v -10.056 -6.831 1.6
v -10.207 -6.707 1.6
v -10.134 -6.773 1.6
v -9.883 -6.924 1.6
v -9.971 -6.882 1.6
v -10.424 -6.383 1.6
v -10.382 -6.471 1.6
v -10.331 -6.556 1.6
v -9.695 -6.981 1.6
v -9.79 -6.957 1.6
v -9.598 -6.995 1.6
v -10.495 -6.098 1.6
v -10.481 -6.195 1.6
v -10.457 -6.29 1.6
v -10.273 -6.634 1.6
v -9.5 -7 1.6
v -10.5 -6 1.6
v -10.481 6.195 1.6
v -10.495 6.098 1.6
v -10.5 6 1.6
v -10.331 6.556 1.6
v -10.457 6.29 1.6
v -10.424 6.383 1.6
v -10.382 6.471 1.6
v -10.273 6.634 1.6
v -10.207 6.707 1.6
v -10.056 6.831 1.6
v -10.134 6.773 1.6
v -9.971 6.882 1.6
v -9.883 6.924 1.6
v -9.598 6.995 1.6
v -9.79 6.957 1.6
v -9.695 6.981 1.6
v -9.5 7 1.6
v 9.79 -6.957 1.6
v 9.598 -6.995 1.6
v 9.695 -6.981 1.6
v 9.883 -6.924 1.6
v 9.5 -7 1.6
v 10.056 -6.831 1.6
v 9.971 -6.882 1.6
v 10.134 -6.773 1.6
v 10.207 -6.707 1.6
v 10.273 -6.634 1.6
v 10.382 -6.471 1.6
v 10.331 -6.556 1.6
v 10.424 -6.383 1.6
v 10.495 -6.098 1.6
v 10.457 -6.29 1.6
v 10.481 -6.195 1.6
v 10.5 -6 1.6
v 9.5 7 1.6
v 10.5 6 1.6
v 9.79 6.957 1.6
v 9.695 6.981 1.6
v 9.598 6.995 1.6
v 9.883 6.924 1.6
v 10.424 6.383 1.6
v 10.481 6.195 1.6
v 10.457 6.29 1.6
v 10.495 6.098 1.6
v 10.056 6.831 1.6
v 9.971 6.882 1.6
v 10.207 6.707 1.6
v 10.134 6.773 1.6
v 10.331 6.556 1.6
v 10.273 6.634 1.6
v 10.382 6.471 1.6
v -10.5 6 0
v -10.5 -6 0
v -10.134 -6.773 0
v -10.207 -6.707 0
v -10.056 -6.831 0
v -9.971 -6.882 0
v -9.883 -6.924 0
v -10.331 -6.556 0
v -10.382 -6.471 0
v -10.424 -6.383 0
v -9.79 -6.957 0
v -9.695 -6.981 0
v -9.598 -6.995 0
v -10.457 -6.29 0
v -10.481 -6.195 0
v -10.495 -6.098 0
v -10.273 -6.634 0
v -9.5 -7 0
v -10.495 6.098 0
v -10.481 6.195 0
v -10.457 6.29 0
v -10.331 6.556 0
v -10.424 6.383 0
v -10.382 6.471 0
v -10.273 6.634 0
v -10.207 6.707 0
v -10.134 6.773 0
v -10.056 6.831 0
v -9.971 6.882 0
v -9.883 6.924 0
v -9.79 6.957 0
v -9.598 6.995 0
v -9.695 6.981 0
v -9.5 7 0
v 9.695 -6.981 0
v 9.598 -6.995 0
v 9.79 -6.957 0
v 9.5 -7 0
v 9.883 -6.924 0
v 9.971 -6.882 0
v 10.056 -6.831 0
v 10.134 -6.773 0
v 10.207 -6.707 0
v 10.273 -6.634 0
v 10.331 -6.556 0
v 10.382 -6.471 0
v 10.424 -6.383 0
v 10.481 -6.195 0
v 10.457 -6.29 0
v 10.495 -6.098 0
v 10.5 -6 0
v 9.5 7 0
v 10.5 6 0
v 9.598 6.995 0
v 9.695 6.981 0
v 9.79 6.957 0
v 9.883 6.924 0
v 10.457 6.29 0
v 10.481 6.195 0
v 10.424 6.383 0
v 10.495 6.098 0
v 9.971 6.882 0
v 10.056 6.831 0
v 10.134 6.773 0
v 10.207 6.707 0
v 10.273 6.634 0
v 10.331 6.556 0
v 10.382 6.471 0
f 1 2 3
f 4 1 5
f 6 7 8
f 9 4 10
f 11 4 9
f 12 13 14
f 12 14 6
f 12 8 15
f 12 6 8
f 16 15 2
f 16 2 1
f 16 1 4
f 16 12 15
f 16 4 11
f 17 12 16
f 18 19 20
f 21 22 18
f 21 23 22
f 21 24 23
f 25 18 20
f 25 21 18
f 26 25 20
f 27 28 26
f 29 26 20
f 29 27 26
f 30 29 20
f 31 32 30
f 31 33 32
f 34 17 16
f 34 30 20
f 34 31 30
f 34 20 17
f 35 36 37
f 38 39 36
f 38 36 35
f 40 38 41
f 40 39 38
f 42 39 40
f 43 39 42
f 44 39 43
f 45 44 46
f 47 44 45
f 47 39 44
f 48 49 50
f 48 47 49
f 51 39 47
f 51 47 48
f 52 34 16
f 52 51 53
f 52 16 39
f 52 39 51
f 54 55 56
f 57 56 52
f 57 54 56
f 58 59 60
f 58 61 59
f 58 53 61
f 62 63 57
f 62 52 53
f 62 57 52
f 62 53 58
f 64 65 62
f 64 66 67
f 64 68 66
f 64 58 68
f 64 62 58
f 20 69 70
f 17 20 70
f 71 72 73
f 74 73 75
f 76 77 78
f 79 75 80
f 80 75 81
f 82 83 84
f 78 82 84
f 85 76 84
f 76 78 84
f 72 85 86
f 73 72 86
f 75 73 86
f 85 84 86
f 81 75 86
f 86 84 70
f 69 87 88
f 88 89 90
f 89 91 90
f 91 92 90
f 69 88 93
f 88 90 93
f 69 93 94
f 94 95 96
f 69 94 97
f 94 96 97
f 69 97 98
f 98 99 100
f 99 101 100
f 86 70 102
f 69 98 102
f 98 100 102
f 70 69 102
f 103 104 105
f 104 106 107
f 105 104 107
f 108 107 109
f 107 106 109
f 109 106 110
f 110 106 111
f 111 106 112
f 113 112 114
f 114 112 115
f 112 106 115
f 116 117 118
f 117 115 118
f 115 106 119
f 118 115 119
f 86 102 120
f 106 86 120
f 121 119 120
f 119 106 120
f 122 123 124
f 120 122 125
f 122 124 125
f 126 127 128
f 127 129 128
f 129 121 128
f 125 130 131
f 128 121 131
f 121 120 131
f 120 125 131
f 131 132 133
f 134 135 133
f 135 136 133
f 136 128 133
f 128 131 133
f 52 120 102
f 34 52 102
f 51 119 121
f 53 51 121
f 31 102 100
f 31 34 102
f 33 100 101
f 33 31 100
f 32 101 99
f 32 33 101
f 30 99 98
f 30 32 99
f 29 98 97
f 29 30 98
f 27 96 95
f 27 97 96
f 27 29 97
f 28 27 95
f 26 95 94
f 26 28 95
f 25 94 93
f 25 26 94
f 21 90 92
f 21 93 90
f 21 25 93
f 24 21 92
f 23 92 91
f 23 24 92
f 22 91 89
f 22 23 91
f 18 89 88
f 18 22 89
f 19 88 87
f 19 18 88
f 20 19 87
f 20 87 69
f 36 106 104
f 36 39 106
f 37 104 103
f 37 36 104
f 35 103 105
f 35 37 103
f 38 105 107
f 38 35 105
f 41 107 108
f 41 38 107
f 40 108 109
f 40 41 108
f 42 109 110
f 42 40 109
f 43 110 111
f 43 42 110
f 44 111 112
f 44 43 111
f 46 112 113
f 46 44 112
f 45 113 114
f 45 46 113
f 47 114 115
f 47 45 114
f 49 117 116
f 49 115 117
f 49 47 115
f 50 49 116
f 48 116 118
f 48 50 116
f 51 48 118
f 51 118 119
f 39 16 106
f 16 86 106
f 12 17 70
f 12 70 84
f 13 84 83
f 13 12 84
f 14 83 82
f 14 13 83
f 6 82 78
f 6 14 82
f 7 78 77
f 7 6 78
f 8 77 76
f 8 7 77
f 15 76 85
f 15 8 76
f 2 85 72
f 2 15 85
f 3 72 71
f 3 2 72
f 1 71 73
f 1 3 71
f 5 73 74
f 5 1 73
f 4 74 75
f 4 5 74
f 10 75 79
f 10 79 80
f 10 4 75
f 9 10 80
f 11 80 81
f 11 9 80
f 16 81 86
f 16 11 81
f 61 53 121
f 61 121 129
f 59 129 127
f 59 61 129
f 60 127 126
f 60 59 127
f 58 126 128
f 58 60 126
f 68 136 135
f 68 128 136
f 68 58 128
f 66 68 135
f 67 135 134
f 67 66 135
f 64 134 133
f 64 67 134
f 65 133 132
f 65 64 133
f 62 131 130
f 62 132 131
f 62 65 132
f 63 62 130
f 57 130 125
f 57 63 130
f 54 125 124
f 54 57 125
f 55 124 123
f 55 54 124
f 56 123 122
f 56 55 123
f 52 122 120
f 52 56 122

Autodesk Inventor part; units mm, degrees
ref_plane "YZ Plane" through (0, 0, 0) normal (1, 0, 0) x (0, 1, 0)
ref_plane "XZ Plane" through (0, 0, 0) normal (0, 1, 0) x (-1, 0, 0)
ref_plane "XY Plane" through (0, 0, 0) normal (0, 0, 1) x (1, 0, 0)
sketch "Sketch1" plane through (0, 0, 0) normal (0, 0, 1) x (1, 0, 0)
  line L0 (-10.5, -7) -> (10.5, -7)
  line L1 (10.5, -7) -> (10.5, 7)
  line L2 (10.5, 7) -> (-10.5, 7)
  line L3 (-10.5, 7) -> (-10.5, -7)
  line L4 (-10.5, -7) -> (10.5, 7) construction
  line L5 (10.5, -7) -> (-10.5, 7) construction
  point P0 (0, 0)
  dimension "d0" = 21
  dimension "d1" = 14
extrude "Extrusion1" add sketch "Sketch1" along normal blind 1.6
fillet "Fillet1" radius 1 4 edges at (10.5, 7, 0.8) (10.5, -7, 0.8) (-10.5, -7, 0.8) (-10.5, 7, 0.8)
sketch "HDMI_ADAPTER_PCB_OUTLINE" plane through (0, 0, 1.6) normal (0, 0, 1) x (1, 0, 0)
  line L0 (6.5, 2.68) -> (6.5, -0.32) projected
  line L1 (6.2, -0.32) -> (6.2, 2.68) projected
  line L2 (6.2, 2.68) -> (6.5, 2.68) projected
  line L3 (6.5, -0.32) -> (6.2, -0.32) projected
  line L4 (-6.5, -0.32) -> (-6.5, 2.68) projected
  line L5 (-6.2, 2.68) -> (-6.2, -0.32) projected
  line L6 (-6.5, 2.68) -> (-6.2, 2.68) projected
  line L7 (-6.2, -0.32) -> (-6.5, -0.32) projected
  circle A0 centre (-6.35, 1.18) radius 1.5
  circle A1 centre (6.35, 1.18) radius 1.5
  arc A2 (-9.5, 7) -> (-10.5, 6) centre (-9.5, 6) ccw projected
  line L8 (-10.5, 6) -> (-10.5, -6) projected
  arc A3 (-10.5, -6) -> (-9.5, -7) centre (-9.5, -6) ccw projected
  line L9 (-9.5, -7) -> (9.5, -7) projected
  arc A4 (9.5, -7) -> (10.5, -6) centre (9.5, -6) ccw projected
  line L10 (10.5, -6) -> (10.5, 6) projected
  arc A5 (10.5, 6) -> (9.5, 7) centre (9.5, 6) ccw projected
  line L11 (9.5, 7) -> (-9.5, 7) projected
  point P0 (0, 0)
  dimension "d5" = 0.3
  dimension "d6" = 0.15
  dimension "d7" = 0.15
equation "\"d6\" = 0.5 * d5"
equation "\"d7\" = d6"
properties part number "HDMI_ADAPTER_PCB"
